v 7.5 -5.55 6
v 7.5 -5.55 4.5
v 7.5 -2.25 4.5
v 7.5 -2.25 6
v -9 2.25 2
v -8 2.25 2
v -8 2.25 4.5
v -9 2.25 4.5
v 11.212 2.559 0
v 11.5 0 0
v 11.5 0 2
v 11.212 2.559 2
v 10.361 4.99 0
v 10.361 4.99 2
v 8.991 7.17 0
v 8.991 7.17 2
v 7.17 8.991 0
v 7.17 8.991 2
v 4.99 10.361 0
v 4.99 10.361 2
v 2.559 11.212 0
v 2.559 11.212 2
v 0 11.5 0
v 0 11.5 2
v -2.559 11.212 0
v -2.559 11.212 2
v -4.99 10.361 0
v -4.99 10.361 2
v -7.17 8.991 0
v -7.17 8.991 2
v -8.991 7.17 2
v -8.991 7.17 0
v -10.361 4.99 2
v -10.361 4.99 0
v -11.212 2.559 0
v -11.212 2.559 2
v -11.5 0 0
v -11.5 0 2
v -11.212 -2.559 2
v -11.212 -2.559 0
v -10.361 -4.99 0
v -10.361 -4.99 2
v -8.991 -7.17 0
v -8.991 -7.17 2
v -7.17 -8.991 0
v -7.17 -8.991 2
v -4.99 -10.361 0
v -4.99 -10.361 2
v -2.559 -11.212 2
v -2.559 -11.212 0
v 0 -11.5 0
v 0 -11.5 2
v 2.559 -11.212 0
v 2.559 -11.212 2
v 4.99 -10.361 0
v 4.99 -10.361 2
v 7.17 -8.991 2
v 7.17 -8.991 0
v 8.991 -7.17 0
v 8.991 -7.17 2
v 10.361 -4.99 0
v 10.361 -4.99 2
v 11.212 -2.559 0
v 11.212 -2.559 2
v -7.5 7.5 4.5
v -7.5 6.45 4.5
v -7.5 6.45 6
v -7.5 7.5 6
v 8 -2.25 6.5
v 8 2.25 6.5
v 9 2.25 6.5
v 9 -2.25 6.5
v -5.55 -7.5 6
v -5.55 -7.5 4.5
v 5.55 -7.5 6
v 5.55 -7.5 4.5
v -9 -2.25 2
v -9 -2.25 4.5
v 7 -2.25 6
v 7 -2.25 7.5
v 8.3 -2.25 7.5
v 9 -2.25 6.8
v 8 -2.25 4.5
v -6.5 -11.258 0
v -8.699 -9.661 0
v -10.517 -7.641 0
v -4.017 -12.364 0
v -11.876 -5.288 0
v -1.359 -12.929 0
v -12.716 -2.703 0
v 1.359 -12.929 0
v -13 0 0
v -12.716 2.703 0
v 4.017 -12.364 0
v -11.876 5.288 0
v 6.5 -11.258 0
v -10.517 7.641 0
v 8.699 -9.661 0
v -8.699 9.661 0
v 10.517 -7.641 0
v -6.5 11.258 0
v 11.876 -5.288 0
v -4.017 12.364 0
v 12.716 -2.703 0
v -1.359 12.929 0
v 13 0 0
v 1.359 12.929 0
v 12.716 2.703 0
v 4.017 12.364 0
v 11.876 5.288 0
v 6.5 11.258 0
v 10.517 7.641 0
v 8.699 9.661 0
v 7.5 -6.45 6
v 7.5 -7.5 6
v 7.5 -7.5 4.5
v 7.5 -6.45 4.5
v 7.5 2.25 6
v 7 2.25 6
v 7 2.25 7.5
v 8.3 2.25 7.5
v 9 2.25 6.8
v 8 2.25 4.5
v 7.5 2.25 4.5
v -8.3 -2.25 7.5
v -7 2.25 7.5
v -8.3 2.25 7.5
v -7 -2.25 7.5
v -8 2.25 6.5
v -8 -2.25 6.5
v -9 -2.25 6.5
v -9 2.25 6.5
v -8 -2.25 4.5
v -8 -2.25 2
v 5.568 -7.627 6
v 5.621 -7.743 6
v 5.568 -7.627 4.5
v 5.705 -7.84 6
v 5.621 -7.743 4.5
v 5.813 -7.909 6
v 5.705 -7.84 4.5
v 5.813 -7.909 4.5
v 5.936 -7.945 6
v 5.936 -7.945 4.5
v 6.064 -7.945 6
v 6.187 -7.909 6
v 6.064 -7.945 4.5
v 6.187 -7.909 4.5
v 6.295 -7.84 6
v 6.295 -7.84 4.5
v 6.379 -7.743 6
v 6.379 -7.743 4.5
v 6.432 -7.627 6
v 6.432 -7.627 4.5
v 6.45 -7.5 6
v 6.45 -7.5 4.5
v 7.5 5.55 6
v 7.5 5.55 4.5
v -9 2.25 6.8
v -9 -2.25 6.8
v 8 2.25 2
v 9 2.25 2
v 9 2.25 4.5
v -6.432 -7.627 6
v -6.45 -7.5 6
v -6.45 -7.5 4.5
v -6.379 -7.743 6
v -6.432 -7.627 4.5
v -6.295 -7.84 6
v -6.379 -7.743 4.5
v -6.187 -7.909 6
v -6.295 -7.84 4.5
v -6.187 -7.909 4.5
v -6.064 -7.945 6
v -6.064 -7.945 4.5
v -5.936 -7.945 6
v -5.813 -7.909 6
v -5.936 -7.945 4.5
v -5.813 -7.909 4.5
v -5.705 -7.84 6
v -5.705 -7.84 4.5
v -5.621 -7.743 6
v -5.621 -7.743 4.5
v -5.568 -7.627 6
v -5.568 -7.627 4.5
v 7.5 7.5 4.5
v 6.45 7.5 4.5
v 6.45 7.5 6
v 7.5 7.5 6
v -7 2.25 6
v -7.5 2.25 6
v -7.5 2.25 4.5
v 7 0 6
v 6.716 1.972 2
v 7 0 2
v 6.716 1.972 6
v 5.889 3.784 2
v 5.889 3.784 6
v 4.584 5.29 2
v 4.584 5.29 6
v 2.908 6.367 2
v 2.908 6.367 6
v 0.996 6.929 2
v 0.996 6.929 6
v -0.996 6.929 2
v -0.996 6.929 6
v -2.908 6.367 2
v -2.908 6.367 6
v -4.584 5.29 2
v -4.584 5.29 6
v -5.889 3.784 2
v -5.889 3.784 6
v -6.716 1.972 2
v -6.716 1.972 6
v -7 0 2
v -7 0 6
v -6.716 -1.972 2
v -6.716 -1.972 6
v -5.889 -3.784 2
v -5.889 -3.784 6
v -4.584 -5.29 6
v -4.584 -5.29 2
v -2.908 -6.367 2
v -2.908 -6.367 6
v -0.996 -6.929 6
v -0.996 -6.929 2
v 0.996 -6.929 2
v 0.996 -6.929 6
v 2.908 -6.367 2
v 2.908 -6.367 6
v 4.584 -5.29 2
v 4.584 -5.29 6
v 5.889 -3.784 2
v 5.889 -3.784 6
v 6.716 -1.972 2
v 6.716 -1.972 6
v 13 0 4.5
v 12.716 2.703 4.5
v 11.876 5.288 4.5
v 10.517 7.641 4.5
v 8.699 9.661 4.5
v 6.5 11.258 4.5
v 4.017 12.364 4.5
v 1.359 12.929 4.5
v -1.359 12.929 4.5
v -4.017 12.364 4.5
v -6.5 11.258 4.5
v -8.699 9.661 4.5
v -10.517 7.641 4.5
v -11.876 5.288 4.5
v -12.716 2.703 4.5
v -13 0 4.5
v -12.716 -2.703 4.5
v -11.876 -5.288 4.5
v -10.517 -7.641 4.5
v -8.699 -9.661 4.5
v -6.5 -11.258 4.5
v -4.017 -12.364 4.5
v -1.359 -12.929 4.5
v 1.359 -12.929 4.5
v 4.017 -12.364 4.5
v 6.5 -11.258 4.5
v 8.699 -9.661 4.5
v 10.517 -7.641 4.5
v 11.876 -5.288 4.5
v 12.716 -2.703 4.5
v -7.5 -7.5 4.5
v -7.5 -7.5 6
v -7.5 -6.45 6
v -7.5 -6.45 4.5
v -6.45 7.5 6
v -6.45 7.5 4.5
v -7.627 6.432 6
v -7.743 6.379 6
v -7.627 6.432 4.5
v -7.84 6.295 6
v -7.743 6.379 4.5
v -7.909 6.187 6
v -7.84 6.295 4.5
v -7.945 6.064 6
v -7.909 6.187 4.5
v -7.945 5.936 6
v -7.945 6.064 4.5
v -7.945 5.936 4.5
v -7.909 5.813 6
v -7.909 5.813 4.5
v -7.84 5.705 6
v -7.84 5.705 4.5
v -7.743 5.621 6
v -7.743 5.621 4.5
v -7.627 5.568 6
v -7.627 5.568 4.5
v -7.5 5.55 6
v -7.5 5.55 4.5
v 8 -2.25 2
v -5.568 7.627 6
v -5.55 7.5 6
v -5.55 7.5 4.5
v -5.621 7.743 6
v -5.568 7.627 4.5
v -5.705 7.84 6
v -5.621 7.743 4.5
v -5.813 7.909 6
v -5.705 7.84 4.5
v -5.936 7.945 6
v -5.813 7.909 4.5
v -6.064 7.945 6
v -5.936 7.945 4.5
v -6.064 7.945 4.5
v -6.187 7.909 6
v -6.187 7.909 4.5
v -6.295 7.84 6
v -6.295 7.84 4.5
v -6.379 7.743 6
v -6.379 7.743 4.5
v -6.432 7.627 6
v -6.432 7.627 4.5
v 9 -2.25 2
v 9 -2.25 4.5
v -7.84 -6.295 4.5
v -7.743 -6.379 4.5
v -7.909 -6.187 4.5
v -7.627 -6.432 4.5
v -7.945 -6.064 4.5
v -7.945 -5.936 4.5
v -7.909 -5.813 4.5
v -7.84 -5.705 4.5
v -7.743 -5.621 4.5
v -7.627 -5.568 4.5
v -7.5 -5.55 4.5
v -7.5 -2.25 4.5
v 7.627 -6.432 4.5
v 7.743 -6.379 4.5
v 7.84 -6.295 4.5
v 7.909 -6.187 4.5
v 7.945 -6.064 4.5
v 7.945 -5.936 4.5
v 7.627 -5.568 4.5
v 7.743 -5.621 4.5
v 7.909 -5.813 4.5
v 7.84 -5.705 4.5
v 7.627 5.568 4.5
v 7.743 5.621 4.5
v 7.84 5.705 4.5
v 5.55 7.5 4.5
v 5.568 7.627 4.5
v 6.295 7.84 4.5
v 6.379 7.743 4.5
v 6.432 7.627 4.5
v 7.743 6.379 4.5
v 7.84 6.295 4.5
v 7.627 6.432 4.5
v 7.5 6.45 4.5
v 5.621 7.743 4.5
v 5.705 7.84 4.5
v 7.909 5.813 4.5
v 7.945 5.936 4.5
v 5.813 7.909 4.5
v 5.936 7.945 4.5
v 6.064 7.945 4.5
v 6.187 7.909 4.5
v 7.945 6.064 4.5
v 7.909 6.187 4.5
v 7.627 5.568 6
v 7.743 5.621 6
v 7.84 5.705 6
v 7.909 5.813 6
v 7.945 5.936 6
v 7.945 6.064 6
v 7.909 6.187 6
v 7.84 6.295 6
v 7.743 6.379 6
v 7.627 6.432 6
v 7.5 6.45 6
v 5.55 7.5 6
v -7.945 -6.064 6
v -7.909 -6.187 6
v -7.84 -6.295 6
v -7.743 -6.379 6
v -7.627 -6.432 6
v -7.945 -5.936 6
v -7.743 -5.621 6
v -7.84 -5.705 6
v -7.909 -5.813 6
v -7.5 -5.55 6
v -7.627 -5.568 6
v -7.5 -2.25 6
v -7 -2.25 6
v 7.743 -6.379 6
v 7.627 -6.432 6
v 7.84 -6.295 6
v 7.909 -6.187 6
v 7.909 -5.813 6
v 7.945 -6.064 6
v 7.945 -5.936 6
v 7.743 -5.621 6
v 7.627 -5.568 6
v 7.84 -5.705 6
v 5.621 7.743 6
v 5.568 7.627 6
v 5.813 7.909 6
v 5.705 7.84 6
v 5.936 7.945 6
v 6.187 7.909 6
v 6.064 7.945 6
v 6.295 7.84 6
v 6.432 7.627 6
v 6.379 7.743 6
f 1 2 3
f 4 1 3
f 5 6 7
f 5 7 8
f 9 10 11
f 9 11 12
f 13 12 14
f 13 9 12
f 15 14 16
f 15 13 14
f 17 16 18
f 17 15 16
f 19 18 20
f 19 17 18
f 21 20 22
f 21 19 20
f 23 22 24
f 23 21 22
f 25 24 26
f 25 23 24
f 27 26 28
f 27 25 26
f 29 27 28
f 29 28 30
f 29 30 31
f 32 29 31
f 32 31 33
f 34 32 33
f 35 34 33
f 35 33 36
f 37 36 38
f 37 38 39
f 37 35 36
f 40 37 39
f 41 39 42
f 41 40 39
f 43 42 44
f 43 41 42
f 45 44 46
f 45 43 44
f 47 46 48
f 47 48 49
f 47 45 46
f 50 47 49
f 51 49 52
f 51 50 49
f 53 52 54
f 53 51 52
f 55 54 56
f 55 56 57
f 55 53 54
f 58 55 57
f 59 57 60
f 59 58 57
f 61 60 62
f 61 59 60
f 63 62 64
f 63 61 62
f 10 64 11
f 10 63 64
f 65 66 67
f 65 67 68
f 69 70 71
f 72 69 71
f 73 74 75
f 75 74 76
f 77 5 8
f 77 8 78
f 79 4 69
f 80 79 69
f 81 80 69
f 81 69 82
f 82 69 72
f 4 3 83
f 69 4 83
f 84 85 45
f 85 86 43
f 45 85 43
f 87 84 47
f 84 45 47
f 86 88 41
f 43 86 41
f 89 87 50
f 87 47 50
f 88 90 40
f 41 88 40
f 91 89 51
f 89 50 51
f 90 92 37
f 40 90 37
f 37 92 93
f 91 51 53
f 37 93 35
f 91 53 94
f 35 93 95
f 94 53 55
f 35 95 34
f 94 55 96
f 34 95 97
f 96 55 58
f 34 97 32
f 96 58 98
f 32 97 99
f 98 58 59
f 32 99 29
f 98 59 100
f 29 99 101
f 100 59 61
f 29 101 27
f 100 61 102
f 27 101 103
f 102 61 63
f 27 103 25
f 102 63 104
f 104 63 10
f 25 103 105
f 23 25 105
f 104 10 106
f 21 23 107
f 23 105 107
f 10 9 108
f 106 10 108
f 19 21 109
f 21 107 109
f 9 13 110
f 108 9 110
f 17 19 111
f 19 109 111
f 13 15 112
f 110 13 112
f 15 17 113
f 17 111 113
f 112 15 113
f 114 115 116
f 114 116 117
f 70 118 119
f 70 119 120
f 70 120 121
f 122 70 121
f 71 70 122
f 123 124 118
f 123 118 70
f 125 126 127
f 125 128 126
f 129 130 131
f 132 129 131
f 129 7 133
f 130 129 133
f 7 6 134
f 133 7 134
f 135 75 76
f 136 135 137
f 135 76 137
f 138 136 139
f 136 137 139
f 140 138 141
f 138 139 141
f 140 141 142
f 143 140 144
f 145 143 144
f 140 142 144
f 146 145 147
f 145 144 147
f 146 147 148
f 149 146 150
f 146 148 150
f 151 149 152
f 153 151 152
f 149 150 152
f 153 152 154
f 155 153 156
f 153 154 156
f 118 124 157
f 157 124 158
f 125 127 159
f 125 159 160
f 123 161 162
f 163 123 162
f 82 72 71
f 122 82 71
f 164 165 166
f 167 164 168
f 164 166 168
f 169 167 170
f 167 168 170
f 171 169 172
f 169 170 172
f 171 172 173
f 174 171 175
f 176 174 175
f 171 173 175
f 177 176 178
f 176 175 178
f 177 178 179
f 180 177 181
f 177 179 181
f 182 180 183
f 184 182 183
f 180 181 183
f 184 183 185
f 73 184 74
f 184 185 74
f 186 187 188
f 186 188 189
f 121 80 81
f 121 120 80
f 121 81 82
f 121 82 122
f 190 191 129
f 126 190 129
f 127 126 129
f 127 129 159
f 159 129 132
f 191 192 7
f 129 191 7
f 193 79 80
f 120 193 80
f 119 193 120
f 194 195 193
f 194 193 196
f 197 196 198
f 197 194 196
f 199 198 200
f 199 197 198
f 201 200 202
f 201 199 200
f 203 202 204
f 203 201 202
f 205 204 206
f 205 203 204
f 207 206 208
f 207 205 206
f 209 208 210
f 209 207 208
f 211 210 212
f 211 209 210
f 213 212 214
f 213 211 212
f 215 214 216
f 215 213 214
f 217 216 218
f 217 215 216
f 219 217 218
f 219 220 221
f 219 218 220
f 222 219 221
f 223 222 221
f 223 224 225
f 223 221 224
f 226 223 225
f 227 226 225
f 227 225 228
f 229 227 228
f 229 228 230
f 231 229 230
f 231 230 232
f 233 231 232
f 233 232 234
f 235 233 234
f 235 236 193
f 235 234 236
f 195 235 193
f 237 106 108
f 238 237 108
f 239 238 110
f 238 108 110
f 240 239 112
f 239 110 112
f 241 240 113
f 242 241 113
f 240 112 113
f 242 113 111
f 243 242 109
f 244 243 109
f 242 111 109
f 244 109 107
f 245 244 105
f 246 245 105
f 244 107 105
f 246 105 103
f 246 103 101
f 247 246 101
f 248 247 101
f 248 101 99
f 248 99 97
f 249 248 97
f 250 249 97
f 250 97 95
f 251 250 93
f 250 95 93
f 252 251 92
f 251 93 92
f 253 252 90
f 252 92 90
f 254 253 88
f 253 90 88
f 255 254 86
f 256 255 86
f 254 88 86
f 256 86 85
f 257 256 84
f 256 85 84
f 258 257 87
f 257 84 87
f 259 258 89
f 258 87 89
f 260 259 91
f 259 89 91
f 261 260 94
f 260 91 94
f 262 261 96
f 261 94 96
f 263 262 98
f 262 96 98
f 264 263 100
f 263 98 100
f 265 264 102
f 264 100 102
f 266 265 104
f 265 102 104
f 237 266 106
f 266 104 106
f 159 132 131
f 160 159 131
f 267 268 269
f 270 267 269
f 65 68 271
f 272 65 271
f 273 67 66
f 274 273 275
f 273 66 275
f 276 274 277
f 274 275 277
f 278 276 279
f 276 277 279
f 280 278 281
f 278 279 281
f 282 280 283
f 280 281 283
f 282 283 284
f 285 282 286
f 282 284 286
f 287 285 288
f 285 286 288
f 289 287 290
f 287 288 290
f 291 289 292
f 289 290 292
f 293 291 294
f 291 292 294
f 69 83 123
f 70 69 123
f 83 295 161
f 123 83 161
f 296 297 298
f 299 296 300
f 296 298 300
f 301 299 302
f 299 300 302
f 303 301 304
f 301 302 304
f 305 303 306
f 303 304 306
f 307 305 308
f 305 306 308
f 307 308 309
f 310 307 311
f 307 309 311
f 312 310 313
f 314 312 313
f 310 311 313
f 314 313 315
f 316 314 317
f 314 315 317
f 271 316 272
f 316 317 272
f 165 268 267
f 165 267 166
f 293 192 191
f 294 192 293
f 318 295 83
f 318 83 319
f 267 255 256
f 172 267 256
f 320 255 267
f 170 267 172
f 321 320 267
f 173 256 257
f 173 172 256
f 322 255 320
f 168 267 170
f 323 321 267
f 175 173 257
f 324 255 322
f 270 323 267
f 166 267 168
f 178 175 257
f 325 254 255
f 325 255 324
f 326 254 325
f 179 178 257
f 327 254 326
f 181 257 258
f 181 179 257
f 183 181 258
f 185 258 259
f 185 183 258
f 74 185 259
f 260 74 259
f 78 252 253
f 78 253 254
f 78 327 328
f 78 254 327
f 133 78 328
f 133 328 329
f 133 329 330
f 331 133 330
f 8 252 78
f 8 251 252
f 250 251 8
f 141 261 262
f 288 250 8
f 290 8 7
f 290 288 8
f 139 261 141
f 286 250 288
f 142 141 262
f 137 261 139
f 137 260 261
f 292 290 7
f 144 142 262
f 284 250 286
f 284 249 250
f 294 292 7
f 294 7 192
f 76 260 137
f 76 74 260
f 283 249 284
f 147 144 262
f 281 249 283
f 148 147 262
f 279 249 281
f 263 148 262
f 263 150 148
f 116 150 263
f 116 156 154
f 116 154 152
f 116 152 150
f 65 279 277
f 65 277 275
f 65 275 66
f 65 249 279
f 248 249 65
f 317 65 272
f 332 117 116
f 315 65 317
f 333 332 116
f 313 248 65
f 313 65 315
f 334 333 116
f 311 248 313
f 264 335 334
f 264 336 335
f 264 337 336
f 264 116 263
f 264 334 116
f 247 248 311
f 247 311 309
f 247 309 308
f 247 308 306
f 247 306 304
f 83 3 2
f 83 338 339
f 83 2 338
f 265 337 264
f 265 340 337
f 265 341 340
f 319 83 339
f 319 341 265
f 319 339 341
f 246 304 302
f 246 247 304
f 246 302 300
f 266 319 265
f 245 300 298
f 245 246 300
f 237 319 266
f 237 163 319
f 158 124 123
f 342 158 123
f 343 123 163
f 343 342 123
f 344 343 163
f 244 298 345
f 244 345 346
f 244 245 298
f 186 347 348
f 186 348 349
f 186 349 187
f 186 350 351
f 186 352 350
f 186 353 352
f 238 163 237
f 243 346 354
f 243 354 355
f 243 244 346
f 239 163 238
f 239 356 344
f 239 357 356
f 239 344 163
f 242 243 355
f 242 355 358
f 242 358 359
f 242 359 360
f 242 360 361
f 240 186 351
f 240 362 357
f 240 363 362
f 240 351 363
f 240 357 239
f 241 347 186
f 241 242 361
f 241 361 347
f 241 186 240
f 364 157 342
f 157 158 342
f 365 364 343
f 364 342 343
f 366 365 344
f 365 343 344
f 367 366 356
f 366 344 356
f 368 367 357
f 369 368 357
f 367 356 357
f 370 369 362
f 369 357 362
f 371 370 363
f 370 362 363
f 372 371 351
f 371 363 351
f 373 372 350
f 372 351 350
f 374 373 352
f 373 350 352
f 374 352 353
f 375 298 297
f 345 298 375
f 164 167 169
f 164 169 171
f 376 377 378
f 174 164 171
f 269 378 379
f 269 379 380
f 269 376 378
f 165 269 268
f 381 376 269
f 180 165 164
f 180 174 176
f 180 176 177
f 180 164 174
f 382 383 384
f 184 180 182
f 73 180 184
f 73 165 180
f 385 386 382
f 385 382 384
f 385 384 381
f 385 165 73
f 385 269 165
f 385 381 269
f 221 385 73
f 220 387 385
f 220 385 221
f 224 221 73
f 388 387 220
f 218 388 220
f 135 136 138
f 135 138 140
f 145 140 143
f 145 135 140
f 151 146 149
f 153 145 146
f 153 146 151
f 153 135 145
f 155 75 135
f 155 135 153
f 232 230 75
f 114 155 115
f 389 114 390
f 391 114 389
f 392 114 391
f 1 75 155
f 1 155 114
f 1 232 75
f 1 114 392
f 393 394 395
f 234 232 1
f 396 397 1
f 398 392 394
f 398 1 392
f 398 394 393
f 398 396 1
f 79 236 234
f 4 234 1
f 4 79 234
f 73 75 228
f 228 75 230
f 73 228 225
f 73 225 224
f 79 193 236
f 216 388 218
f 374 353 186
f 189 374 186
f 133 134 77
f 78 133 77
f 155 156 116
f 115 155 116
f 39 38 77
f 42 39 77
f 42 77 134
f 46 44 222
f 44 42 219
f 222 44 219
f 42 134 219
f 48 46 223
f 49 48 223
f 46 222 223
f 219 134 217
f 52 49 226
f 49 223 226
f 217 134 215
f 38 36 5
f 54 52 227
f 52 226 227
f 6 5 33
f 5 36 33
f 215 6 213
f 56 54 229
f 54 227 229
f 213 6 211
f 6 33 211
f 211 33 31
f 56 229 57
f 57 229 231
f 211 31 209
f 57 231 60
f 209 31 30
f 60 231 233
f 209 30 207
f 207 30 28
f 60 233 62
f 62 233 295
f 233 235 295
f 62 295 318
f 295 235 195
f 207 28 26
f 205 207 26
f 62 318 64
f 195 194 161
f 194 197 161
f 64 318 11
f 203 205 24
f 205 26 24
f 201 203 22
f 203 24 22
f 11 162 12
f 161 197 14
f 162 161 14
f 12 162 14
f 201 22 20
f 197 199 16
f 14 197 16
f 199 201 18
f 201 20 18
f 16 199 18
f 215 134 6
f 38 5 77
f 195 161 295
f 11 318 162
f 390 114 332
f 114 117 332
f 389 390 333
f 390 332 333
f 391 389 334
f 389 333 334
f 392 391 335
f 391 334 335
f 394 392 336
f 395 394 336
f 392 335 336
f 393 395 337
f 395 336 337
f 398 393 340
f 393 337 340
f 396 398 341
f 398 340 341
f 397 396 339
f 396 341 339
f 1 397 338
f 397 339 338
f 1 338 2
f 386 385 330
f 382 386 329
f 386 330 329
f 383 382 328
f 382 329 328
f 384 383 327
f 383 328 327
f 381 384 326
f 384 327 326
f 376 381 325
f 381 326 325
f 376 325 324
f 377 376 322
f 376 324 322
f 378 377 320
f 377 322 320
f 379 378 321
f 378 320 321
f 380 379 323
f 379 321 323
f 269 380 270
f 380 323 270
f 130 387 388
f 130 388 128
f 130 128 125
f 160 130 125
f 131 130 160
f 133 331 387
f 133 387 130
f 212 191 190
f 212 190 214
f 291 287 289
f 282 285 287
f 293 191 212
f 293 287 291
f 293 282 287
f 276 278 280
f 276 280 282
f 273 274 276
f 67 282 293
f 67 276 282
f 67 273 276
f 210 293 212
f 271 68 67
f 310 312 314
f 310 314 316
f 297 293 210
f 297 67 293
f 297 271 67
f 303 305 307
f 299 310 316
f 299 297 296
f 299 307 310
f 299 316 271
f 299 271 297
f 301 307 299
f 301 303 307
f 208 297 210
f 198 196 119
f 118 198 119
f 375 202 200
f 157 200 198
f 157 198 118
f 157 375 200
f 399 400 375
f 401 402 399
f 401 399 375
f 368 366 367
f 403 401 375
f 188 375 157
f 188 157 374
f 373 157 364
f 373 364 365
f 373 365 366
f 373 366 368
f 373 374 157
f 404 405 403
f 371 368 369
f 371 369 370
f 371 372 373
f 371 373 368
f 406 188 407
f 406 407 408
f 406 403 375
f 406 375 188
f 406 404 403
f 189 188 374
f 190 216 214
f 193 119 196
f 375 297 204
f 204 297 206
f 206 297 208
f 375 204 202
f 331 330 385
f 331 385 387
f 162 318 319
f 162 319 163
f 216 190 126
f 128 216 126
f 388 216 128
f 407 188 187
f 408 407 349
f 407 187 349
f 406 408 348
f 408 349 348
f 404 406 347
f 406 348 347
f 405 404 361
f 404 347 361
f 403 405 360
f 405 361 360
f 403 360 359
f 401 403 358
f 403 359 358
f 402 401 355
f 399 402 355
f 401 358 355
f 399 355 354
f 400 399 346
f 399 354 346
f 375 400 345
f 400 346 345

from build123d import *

# Parameters (mm, degrees)
BOX002_W          = 1
BOX002_H          = 4.5
BOX002_DEPTH      = 5.75
ARRAY001_COUNT    = 2
BOX001_W          = 2
BOX001_H          = 4.5
BOX001_DEPTH      = 5.5
ARRAY_COUNT       = 2
CYLINDER003_R     = 0.45
CYLINDER003_DEPTH = 2
CYLINDER004_R     = 0.45
CYLINDER004_DEPTH = 2
CYLINDER005_R     = 0.45
CYLINDER005_DEPTH = 2
CYLINDER006_R     = 0.45
CYLINDER006_DEPTH = 2
CYLINDER007_R     = 0.45
CYLINDER007_DEPTH = 2
CYLINDER008_R     = 0.45
CYLINDER008_DEPTH = 2
CYLINDER009_R     = 0.45
CYLINDER009_DEPTH = 2
CYLINDER010_R     = 0.45
CYLINDER010_DEPTH = 2
CYLINDER002_R     = 7
CYLINDER002_DEPTH = 10
CYLINDER001_R     = 11.5
CYLINDER001_DEPTH = 2
BOX_W             = 15
BOX_H             = 15
BOX_DEPTH         = 2
CYLINDER_R        = 13
CYLINDER_DEPTH    = 4.5
CHAMFER_SIZE      = 0.7


with BuildPart() as array001:
    # Box002 → Box002 (new body)
    with BuildSketch(Plane(origin=(8, -2.25, 0.75), x_dir=(1, 0, 0), z_dir=(0, 0, 1))):
        with Locations((0.5, 2.25)):
            Rectangle(BOX002_W, BOX002_H)
    extrude(amount=BOX002_DEPTH)

    # Array001: Array001 ×2 about axis
    array001_axis = Axis((0, 0, 0), (0, 0, 1))


with BuildPart() as array001_1:
    add(array001.part)
    for i in range(1, ARRAY001_COUNT):
        add(array001.part.rotate(array001_axis, i * 360 / ARRAY001_COUNT))


with BuildPart() as array:
    # Box001 → Box001 (new body)
    with BuildSketch(Plane(origin=(7, -2.25, 2), x_dir=(1, 0, 0), z_dir=(0, 0, 1))):
        with Locations((1, 2.25)):
            Rectangle(BOX001_W, BOX001_H)
    extrude(amount=BOX001_DEPTH)

    # Array: Array ×2 about axis
    array_axis = Axis((0, 0, 0), (0, 0, 1))


with BuildPart() as array_1:
    add(array.part)
    for i in range(1, ARRAY_COUNT):
        add(array.part.rotate(array_axis, i * 360 / ARRAY_COUNT))


with BuildPart() as cilindro003:
    # Cylinder003 → Cylinder003 (new body)
    with BuildSketch(Plane(origin=(6, 7.5, 4), x_dir=(1, 0, 0), z_dir=(0, 0, 1))):
        Circle(CYLINDER003_R)
    extrude(amount=CYLINDER003_DEPTH)


with BuildPart() as cilindro004:
    # Cylinder004 → Cylinder004 (new body)
    with BuildSketch(Plane(origin=(-6, 7.5, 4), x_dir=(1, 0, 0), z_dir=(0, 0, 1))):
        Circle(CYLINDER004_R)
    extrude(amount=CYLINDER004_DEPTH)


with BuildPart() as cilindro005:
    # Cylinder005 → Cylinder005 (new body)
    with BuildSketch(Plane(origin=(6, -7.5, 4), x_dir=(1, 0, 0), z_dir=(0, 0, 1))):
        Circle(CYLINDER005_R)
    extrude(amount=CYLINDER005_DEPTH)


with BuildPart() as cilindro006:
    # Cylinder006 → Cylinder006 (new body)
    with BuildSketch(Plane(origin=(-6, -7.5, 4), x_dir=(1, 0, 0), z_dir=(0, 0, 1))):
        Circle(CYLINDER006_R)
    extrude(amount=CYLINDER006_DEPTH)


with BuildPart() as cilindro007:
    # Cylinder007 → Cylinder007 (new body)
    with BuildSketch(Plane(origin=(7.5, 6, 4), x_dir=(1, 0, 0), z_dir=(0, 0, 1))):
        Circle(CYLINDER007_R)
    extrude(amount=CYLINDER007_DEPTH)


with BuildPart() as cilindro008:
    # Cylinder008 → Cylinder008 (new body)
    with BuildSketch(Plane(origin=(-7.5, 6, 4), x_dir=(1, 0, 0), z_dir=(0, 0, 1))):
        Circle(CYLINDER008_R)
    extrude(amount=CYLINDER008_DEPTH)


with BuildPart() as cilindro009:
    # Cylinder009 → Cylinder009 (new body)
    with BuildSketch(Plane(origin=(7.5, -6, 4), x_dir=(1, 0, 0), z_dir=(0, 0, 1))):
        Circle(CYLINDER009_R)
    extrude(amount=CYLINDER009_DEPTH)


with BuildPart() as cilindro010:
    # Cylinder010 → Cylinder010 (new body)
    with BuildSketch(Plane(origin=(-7.5, -6, 4), x_dir=(1, 0, 0), z_dir=(0, 0, 1))):
        Circle(CYLINDER010_R)
    extrude(amount=CYLINDER010_DEPTH)


with BuildPart() as cilindro002:
    # Cylinder002 → Cylinder002 (new body)
    with BuildSketch(Plane.XY):
        Circle(CYLINDER002_R)
    extrude(amount=CYLINDER002_DEPTH)


with BuildPart() as cilindro001:
    # Cylinder001 → Cylinder001 (new body)
    with BuildSketch(Plane.XY):
        Circle(CYLINDER001_R)
    extrude(amount=CYLINDER001_DEPTH)


with BuildPart() as cubo:
    # Box → Box (new body)
    with BuildSketch(Plane(origin=(-7.5, -7.5, 4), x_dir=(1, 0, 0), z_dir=(0, 0, 1))):
        with Locations((7.5, 7.5)):
            Rectangle(BOX_W, BOX_H)
    extrude(amount=BOX_DEPTH)


with BuildPart() as chamfer_body:
    # Cylinder → Cylinder (new body)
    with BuildSketch(Plane.XY):
        Circle(CYLINDER_R)
    extrude(amount=CYLINDER_DEPTH)

    # Fusion: union Cubo
    add(cubo.part)

    # Cut: cut Cilindro001
    add(cilindro001.part, mode=Mode.SUBTRACT)

    # Cut001: cut Cilindro002
    add(cilindro002.part, mode=Mode.SUBTRACT)

    # Fusion001: union Cilindro003, Cilindro004, Cilindro005, Cilindro006, Cilindro007, Cilindro008, Cilindro009, Cilindro010
    add(cilindro003.part)
    add(cilindro004.part)
    add(cilindro005.part)
    add(cilindro006.part)
    add(cilindro007.part)
    add(cilindro008.part)
    add(cilindro009.part)
    add(cilindro010.part)

    # Fusion002: union Array
    add(array_1.part)

    # Cut002: cut Array001
    add(array001_1.part, mode=Mode.SUBTRACT)

    # Chamfer
    chamfer_edges = [chamfer_body.edges().sort_by_distance(p)[0] for p in [
        (9, 0, 7.5),
        (-9, 0, 7.5),
    ]]
    chamfer(chamfer_edges, length=CHAMFER_SIZE)


solid = chamfer_body.part
